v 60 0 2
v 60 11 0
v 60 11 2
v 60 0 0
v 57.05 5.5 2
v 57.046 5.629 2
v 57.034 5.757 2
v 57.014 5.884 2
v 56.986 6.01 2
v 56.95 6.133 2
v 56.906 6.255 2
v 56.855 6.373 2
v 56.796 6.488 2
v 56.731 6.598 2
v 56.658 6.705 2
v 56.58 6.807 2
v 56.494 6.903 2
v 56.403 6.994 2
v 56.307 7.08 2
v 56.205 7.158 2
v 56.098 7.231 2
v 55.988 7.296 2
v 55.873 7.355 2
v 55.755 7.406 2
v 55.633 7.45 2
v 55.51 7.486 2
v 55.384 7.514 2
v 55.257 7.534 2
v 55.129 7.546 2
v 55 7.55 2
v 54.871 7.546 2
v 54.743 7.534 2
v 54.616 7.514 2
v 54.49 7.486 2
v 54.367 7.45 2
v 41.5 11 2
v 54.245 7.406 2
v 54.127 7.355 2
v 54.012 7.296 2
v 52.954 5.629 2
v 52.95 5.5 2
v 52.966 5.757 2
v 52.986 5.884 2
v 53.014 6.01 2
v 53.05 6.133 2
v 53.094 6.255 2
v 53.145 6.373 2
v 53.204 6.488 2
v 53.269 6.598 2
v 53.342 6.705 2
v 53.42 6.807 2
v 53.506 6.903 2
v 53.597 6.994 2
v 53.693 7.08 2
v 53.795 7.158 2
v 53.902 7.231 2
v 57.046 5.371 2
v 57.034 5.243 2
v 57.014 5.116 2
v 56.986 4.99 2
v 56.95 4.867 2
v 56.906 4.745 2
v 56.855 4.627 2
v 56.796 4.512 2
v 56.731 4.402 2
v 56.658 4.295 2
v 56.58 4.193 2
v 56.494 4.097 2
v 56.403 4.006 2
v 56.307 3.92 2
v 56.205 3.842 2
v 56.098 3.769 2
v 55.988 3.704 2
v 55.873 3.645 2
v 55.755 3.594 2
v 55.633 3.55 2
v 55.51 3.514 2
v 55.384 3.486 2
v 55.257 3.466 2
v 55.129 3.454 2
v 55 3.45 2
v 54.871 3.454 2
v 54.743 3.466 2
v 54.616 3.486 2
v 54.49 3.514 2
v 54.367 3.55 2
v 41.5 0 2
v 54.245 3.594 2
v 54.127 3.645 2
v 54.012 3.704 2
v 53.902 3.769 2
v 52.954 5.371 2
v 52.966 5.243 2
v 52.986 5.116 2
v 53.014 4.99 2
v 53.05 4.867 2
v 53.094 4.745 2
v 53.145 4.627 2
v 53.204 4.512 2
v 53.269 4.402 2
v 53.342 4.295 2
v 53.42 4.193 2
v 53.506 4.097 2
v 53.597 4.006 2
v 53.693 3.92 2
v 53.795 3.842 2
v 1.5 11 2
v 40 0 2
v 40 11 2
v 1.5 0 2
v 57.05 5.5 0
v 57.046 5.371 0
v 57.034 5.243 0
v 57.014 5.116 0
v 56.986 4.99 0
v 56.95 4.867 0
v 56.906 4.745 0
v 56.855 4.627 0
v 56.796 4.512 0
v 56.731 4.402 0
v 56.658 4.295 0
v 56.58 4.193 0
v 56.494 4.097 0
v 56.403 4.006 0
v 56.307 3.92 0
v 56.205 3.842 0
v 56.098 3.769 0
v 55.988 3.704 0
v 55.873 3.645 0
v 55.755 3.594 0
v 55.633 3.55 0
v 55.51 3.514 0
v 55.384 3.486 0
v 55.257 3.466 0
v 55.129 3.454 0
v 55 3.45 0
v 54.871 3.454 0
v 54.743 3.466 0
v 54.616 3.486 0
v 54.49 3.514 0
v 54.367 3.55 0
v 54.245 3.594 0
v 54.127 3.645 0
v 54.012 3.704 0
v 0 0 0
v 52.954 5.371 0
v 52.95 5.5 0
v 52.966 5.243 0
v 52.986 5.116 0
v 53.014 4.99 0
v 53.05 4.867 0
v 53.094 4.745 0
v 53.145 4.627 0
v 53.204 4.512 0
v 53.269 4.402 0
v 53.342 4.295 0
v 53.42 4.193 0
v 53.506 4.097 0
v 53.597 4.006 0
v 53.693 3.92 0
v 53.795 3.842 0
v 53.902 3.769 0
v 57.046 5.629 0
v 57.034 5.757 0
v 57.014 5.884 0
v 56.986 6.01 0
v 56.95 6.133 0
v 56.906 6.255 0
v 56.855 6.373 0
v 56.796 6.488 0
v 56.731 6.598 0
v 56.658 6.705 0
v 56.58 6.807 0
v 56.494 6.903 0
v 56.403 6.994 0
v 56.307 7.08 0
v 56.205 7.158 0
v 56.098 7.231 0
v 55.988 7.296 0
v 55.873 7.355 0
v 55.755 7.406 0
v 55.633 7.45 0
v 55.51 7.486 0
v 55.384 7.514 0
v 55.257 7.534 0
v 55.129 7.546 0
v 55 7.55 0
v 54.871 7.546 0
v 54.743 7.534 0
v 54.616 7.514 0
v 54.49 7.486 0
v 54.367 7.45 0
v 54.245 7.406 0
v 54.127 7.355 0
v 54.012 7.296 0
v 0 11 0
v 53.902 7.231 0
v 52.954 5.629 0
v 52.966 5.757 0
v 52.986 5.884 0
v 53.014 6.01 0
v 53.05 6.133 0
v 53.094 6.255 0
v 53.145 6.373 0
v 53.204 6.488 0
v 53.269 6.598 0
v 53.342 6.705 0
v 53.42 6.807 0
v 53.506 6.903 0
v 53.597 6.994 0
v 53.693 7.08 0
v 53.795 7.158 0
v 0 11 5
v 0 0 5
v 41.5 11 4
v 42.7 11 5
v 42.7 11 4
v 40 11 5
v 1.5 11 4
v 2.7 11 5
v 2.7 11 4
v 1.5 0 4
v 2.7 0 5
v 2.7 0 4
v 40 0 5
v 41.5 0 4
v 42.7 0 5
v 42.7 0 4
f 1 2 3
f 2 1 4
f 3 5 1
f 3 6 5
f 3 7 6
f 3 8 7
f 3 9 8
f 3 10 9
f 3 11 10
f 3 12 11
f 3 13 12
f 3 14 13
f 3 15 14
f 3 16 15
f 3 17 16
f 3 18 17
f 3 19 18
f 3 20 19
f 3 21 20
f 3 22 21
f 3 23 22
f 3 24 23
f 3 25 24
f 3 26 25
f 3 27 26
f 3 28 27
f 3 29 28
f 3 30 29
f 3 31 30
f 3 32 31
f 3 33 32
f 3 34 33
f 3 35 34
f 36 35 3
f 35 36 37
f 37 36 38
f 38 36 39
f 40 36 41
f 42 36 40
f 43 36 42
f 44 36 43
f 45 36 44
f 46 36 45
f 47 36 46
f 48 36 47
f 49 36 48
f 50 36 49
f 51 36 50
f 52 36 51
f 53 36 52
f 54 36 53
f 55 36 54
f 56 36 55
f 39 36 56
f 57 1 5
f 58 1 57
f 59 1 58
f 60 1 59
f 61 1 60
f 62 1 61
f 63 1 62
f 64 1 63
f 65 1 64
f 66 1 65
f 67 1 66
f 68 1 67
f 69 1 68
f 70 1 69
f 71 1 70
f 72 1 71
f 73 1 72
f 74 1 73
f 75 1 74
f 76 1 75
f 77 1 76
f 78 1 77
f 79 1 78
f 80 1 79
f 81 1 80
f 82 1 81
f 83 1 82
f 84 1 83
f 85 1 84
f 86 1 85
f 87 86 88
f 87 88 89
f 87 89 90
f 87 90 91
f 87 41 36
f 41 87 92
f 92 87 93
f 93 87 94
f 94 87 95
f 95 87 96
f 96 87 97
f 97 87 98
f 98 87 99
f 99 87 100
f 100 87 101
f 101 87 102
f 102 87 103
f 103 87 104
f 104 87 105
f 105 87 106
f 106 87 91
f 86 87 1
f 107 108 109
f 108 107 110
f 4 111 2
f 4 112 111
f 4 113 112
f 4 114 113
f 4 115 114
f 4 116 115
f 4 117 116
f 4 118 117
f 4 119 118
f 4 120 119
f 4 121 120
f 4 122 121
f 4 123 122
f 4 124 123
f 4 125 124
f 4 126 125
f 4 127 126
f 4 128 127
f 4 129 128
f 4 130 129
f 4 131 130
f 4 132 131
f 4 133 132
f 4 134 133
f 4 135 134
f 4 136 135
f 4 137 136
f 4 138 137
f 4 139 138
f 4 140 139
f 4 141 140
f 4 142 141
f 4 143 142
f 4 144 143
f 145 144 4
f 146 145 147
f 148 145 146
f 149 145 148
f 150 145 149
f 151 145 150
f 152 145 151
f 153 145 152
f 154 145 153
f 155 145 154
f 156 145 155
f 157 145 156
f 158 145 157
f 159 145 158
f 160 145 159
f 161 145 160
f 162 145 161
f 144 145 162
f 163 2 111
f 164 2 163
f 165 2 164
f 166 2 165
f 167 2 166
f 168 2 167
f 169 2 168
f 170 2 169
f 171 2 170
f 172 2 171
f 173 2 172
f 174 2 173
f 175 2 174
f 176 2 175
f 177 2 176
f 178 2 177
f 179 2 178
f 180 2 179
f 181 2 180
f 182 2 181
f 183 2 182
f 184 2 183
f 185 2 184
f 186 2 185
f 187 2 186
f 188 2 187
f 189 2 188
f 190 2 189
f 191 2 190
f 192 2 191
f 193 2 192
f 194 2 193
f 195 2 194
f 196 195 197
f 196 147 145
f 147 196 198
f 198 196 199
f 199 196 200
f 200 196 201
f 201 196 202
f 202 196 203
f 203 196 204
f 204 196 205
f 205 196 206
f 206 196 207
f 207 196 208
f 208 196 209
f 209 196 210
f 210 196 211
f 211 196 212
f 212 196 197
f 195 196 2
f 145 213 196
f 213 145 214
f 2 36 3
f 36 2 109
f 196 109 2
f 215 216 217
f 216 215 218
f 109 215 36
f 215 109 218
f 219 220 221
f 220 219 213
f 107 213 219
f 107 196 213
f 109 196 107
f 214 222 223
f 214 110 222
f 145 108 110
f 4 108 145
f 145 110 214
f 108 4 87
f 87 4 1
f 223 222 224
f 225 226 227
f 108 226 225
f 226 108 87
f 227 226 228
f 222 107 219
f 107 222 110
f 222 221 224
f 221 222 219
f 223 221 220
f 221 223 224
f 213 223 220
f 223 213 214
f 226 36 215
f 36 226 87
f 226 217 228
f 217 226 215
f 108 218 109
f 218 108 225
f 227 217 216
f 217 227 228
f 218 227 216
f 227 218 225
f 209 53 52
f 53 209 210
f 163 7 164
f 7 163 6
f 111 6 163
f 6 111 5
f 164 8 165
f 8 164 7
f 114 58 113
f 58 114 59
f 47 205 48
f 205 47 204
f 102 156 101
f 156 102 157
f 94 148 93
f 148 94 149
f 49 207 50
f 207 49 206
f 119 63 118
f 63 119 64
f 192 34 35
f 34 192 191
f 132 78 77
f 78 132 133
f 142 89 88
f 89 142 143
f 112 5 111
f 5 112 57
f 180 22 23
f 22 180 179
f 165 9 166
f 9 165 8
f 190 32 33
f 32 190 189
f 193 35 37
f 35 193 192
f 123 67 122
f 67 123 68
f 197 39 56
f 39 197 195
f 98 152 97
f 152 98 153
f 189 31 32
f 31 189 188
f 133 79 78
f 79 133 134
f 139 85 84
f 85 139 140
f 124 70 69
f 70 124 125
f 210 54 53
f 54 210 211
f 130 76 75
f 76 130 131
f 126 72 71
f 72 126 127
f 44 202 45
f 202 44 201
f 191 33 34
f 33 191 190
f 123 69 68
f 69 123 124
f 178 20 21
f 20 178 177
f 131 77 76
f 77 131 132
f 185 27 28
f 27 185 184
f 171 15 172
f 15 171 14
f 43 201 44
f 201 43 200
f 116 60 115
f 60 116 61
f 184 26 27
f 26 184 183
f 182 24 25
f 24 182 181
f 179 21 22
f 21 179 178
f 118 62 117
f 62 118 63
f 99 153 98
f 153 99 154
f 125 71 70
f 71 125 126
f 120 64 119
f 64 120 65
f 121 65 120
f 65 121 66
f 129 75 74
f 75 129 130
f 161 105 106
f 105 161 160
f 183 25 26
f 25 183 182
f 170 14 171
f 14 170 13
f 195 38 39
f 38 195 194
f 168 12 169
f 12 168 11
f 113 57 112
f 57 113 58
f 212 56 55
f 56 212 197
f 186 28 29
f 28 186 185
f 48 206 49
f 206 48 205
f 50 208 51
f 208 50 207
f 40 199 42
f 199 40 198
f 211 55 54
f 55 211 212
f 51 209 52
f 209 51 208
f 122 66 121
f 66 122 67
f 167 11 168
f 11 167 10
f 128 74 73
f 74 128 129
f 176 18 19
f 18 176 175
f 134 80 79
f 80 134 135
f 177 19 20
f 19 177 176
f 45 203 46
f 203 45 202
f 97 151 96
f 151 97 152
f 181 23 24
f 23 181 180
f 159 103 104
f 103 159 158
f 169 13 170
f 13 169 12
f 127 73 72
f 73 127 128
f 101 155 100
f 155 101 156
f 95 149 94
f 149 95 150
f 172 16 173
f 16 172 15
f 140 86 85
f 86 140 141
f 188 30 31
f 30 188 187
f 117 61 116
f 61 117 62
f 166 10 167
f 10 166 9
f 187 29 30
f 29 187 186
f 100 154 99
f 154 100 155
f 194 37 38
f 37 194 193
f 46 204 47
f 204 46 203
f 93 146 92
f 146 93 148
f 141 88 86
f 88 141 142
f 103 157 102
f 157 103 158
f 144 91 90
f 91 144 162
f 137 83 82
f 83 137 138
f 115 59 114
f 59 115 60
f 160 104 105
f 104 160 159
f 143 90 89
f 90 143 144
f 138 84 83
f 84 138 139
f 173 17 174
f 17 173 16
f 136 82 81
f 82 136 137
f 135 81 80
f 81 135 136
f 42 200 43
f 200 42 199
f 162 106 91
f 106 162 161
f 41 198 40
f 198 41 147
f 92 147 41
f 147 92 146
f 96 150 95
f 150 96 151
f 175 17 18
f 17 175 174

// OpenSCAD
$fn=100;

difference() {
    
union() {
    
    cube([60,11,2]);
    
    translate([0,0,2]) {
      cube([1.5,11,2]);  
    }
    
    translate([0,0,4]) {
       cube([2.7,11,1]);
    }
    
    translate([40,0,2]) {
      cube([1.5,11,2]);  
    }
    
    translate([40,0,4]) {
       cube([2.7,11,1]);
    }
}

    translate([55,11/2,0]){
    cylinder(h=10, r=4.1/2);
    }
}
